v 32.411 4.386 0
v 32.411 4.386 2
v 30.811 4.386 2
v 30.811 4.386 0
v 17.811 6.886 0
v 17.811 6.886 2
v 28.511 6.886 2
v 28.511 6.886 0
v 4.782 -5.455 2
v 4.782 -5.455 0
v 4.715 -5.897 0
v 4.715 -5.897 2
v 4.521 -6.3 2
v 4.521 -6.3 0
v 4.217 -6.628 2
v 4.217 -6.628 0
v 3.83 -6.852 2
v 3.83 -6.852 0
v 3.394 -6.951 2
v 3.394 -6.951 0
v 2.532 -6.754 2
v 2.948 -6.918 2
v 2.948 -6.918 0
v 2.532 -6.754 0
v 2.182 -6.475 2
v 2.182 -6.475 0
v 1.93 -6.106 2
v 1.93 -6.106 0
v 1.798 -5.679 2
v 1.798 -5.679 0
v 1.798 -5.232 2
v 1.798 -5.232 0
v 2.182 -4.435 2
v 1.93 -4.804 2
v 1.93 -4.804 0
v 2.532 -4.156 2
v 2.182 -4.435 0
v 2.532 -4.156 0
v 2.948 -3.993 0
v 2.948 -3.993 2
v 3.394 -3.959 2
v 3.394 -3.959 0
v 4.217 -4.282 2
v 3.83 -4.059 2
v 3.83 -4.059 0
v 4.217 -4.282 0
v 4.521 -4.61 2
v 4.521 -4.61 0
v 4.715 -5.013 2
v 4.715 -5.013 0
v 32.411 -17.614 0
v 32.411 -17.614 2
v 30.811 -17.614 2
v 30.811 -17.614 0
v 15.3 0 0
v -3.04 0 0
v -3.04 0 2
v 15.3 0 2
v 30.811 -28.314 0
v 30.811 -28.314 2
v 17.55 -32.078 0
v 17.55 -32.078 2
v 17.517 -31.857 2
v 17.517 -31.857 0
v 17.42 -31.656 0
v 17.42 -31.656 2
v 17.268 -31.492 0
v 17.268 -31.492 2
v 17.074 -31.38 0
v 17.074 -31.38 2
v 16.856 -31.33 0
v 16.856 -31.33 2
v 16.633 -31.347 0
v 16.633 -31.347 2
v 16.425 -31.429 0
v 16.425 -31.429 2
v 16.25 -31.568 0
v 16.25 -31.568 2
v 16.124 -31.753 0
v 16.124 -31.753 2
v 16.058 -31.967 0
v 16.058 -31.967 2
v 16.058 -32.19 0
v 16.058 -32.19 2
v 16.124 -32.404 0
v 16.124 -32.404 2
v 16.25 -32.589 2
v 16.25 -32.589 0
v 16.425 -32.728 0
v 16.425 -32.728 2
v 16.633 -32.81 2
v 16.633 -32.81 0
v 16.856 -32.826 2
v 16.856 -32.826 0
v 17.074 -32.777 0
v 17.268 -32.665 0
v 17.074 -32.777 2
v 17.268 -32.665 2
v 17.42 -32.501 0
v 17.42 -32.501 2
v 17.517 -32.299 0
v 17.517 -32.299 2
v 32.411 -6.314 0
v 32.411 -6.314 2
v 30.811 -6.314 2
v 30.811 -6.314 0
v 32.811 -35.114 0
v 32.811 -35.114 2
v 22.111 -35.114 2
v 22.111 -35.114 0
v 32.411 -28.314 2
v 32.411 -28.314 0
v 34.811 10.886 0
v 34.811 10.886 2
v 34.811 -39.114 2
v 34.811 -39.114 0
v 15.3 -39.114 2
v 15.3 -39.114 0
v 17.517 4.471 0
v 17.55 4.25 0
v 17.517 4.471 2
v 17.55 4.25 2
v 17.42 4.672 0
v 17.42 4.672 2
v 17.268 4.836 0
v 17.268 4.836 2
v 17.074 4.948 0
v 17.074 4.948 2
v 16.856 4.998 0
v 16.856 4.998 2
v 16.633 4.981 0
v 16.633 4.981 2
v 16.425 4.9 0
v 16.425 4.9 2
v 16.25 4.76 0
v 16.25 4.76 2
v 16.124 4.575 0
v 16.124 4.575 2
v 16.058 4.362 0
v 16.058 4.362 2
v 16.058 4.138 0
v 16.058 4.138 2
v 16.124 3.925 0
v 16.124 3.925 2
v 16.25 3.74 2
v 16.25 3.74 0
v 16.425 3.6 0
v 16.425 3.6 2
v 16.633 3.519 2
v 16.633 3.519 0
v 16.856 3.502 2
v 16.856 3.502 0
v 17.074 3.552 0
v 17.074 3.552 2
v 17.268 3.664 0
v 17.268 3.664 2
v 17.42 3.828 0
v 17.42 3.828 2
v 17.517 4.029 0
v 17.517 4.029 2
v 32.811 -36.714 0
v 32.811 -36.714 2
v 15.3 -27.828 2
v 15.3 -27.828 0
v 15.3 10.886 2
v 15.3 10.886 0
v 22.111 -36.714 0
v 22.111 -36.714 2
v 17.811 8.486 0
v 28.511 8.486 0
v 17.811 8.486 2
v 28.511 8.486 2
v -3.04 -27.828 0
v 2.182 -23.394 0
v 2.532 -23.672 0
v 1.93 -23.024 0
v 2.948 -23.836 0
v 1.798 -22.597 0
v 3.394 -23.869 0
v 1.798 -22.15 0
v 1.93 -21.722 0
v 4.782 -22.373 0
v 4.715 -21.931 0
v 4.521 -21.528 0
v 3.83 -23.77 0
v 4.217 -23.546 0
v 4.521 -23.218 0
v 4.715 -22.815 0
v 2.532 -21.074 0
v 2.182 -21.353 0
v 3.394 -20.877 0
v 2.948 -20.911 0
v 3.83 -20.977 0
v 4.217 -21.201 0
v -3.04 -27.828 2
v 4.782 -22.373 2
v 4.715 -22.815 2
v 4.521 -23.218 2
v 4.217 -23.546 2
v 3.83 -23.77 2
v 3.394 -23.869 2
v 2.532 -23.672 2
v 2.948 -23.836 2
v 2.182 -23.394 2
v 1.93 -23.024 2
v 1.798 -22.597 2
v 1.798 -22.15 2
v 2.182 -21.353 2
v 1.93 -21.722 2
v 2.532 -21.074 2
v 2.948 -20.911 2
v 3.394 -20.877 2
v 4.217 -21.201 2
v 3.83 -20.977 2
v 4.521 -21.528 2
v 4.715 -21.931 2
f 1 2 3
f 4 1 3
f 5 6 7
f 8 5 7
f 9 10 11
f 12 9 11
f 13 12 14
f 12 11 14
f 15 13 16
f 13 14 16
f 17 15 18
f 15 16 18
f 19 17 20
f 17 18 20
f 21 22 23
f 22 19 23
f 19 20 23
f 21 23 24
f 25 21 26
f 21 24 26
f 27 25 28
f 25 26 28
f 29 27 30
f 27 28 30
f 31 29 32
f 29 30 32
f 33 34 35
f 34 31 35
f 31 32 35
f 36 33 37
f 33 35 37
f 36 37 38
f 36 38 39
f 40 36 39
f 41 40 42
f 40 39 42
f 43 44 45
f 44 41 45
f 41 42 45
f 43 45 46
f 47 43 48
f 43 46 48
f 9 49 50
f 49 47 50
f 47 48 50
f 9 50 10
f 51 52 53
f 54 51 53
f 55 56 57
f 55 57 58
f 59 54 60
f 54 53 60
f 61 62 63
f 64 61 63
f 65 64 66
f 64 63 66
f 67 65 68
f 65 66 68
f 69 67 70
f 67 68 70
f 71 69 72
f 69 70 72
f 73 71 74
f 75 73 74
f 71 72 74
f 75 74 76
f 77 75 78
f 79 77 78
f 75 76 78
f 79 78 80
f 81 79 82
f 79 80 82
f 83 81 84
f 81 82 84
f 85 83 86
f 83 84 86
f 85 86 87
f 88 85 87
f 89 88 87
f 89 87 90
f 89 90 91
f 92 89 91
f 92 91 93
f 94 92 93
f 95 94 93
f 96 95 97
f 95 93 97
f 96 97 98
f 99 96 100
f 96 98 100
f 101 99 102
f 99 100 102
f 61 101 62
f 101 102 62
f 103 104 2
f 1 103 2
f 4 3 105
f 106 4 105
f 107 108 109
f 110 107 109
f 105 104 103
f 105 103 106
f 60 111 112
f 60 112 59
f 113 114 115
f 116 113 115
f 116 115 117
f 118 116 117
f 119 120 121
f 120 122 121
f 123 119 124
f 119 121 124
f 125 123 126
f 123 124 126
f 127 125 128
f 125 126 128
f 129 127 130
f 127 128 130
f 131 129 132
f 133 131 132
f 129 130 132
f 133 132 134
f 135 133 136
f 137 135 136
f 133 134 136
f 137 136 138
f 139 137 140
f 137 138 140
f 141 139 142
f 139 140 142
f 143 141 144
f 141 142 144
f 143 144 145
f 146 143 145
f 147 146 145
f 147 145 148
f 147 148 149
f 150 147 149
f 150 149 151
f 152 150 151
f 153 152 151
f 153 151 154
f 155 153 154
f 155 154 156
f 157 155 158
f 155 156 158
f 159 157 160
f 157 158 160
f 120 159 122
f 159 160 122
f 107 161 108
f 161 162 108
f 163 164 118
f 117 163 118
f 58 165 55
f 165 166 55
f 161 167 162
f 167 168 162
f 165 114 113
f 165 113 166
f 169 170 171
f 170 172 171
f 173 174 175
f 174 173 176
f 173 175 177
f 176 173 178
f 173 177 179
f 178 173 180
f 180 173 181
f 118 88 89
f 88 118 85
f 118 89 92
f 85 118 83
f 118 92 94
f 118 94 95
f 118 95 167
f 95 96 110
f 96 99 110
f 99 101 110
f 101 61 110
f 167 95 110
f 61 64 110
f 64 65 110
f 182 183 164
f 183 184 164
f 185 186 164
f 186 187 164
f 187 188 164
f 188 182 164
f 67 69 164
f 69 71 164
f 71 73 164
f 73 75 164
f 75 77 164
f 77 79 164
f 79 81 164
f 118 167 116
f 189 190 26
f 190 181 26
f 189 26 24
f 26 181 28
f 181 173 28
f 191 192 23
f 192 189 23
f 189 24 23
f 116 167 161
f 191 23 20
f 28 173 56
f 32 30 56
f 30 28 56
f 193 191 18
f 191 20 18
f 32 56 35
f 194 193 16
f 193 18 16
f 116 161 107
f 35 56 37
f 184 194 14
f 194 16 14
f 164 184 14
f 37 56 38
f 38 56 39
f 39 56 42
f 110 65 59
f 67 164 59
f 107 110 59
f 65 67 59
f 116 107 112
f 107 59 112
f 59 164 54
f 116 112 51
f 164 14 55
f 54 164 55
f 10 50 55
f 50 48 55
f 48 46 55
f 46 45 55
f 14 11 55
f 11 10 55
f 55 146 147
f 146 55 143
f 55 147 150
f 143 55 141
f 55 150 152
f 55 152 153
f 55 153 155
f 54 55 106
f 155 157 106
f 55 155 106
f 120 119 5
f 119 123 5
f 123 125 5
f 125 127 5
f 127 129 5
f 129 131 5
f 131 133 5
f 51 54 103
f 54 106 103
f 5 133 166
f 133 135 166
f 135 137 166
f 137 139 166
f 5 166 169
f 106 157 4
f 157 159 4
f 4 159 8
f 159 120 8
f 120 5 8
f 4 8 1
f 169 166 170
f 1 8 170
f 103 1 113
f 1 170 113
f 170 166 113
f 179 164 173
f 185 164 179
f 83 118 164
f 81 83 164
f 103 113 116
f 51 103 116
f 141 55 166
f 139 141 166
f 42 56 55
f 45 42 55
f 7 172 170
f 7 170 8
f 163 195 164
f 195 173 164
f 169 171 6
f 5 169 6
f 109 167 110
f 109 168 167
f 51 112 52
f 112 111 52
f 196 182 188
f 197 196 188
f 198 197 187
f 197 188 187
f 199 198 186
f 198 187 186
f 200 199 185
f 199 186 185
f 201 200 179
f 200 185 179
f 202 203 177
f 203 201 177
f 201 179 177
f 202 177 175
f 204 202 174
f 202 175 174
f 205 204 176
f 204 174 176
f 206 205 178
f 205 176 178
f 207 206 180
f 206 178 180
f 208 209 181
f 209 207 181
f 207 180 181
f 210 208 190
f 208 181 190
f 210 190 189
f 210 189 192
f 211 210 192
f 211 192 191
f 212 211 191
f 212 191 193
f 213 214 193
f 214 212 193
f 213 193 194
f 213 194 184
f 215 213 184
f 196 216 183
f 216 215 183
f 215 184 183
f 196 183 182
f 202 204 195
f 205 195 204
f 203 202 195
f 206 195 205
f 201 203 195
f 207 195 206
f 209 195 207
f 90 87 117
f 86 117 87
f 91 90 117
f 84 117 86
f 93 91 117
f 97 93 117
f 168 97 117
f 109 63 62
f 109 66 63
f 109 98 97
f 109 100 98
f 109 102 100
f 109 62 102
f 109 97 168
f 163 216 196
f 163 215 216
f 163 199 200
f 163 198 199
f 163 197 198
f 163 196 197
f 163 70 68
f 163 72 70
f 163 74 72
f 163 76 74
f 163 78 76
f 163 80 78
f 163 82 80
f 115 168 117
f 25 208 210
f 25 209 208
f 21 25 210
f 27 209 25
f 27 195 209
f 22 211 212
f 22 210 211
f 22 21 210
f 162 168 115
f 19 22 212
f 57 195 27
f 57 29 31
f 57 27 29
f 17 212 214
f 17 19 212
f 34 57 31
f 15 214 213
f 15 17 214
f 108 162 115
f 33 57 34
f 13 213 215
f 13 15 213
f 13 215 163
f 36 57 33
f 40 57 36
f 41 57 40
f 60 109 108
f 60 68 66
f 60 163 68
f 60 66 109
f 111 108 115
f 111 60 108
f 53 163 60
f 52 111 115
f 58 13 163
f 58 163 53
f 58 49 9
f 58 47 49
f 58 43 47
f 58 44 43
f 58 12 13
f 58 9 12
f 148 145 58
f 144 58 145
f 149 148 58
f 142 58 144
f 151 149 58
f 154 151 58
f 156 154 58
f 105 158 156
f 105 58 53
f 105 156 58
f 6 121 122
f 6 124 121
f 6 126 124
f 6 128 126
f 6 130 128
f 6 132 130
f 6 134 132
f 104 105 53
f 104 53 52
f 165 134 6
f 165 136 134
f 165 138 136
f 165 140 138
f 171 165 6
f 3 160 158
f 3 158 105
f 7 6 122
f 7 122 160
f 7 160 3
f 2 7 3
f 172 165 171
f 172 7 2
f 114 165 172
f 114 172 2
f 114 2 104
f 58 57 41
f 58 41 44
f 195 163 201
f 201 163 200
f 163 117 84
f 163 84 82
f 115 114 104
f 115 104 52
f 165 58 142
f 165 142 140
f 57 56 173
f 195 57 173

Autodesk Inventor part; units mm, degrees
ref_plane "YZ Plane" through (0, 0, 0) normal (1, 0, 0) x (0, 1, 0)
ref_plane "XZ Plane" through (0, 0, 0) normal (0, 1, 0) x (-1, 0, 0)
ref_plane "XY Plane" through (0, 0, 0) normal (0, 0, 1) x (1, 0, 0)
sketch "Sketch1" plane through (0, 0, 0) normal (0, 0, 1) x (1, 0, 0)
  circle A0 centre (3.2816, -5.4552) radius 1.5 projected
  line L0 (4.45, -12.0667) -> (7.65, -10.2192) projected
  line L1 (7.65, -10.2192) -> (10.85, -12.0667) projected
  line L2 (10.85, -12.0667) -> (10.85, -15.7617) projected
  line L3 (10.85, -15.7617) -> (7.65, -17.6093) projected
  line L4 (7.65, -17.6093) -> (4.45, -15.7617) projected
  line L5 (4.45, -15.7617) -> (4.45, -12.0667) projected
  circle A1 centre (3.2816, -22.3733) radius 1.5 projected
  line L6 (15.3, -27.8284) -> (15.3, 0) projected
  line L7 (0, 0) -> (15.3, 0) projected
  line L8 (0, -27.8284) -> (0, 0) projected
  line L9 (0, -27.8284) -> (15.3, -27.8284) projected
  line L10 (28.3, 5.8858) -> (15.3, 5.8858) projected
  line L11 (15.3, 5.8858) -> (15.3, -34.1142) projected
  line L12 (28.3, -34.1142) -> (15.3, -34.1142) projected
  line L13 (28.3, 5.8858) -> (28.3, -34.1142) projected
  line L14 (38.8108, -39.1142) -> (38.8108, 10.8858) projected
  line L15 (38.8108, 10.8858) -> (15.3, 10.8858) projected
  line L16 (15.3, -2.6142) -> (15.3, 10.8858) projected
  line L17 (15.3, -2.6142) -> (38.3, -2.6142) projected
  line L18 (38.3, -12.6142) -> (38.3, -2.6142) projected
  line L19 (38.3, -12.6142) -> (7.65, -12.6142) projected
  arc A2 (7.65, -15.6142) -> (7.65, -12.6142) centre (7.65, -14.1142) ccw projected
  line L20 (7.65, -15.6142) -> (38.3, -15.6142) projected
  line L21 (38.3, -25.6142) -> (38.3, -15.6142) projected
  line L22 (38.3, -25.6142) -> (15.3, -25.6142) projected
  line L23 (15.3, -39.1142) -> (15.3, -25.6142) projected
  line L24 (38.8108, -39.1142) -> (15.3, -39.1142) projected
  line L25 (-7.04, -39.1142) -> (14.96, -39.1142) projected
  line L26 (-7.04, -39.1142) -> (38.8108, -39.1142)
  line L27 (38.8108, -39.1142) -> (38.8108, 10.8858)
  line L28 (38.8108, 10.8858) -> (-7.04, 10.8858)
  line L29 (-7.04, 10.8858) -> (-7.04, -39.1142)
  line L30 (-5.04, -27.8284) -> (13.16, -27.8284) projected
  line L31 (13.16, 0) -> (-5.04, 0) projected
  line L32 (-3.04, -35.1142) -> (34.8108, -35.1142)
  line L33 (34.8108, -35.1142) -> (34.8108, 6.8858)
  line L34 (34.8108, 6.8858) -> (-3.04, 6.8858)
  line L35 (-3.04, 6.8858) -> (-3.04, -35.1142)
  line L36 (34.8108, -35.1142) -> (15.3, -35.1142)
  line L37 (15.3, -35.1142) -> (15.3, -39.1142)
  line L38 (15.3, -39.1142) -> (34.8108, -39.1142)
  line L39 (34.8108, -39.1142) -> (34.8108, -35.1142)
  line L40 (15.3, 6.8858) -> (34.8108, 6.8858)
  line L41 (34.8108, 6.8858) -> (34.8108, 10.8858)
  line L42 (34.8108, 10.8858) -> (15.3, 10.8858)
  line L43 (15.3, 10.8858) -> (15.3, 6.8858)
  point P0 (-3.04, 0)
  point P1 (-3.04, -27.8284)
  dimension "d0" = 4
extrude "Extrusion1" add sketch "Sketch1" along normal blind 2 contours L5 L4 L3 L2 L20 L6 L9 L8 L7 L19 L1 L0 | L0 L1 L2 L19 A2 L20 L3 L4 L5 | L19 L6 L20 L2 | L2 L20 A2 L19 | L19 L13 L20 L6 | L6 L17 L13 L19 | L20 L13 L22 L6 | L6 L11 L10 L13 L17 | L19 L33 L20 L13 | L13 L17 L33 L19 | L22 L13 L12 L11 L6 | L20 L33 L22 L13 | L13 L10 L16 L34 L33 L17 | L33 L17 L18 L19 | L19 L18 L17 L33 L41 L15 L14 L24 L39 L22 L21 L20 | L22 L33 L32 L23 L12 L13 | L20 L21 L22 L33 | L8 L30 L35 L31 | L16 L15 L41 L34 | L32 L39 L24 L23
sketch "Sketch2" plane through (0, 0, 2) normal (0, 0, 1) x (1, 0, 0)
  line L0 (15.3, 0) -> (-3.04, 0) projected
  line L1 (-3.04, 0) -> (-3.04, -27.8284) projected
  line L2 (-3.04, -27.8284) -> (15.3, -27.8284) projected
  line L3 (15.3, -27.8284) -> (15.3, -39.1142) projected
  line L4 (15.3, -39.1142) -> (38.8108, -39.1142) projected
  line L5 (38.8108, -39.1142) -> (38.8108, 10.8858) projected
  line L6 (38.8108, 10.8858) -> (15.3, 10.8858) projected
  line L7 (15.3, 10.8858) -> (15.3, 0) projected
  circle A0 centre (3.2816, -22.3733) radius 1.5 projected
  circle A1 centre (3.2816, -5.4552) radius 1.5 projected
  line L8 (15.3, -39.1142) -> (38.8108, -39.1142) projected
  line L9 (38.8108, 10.8858) -> (34.8108, 10.8858)
  line L10 (34.8108, 10.8858) -> (34.8108, -39.1142)
  line L11 (34.8108, -39.1142) -> (38.8108, -39.1142)
  line L12 (38.8108, -39.1142) -> (38.8108, 10.8858)
  point P0 (0, 0)
  dimension "d3" = 4
extrude "Extrusion2" cut sketch "Sketch2" against normal blind 2 contours L6 L5 L4 L10
sketch "Sketch3" plane through (0, 0, 2) normal (0, 0, 1) x (1, 0, 0)
  point P0 (0, 0)
sketch "Sketch4" plane through (0, 0, 2) normal (0, 0, 1) x (1, 0, 0)
  circle A0 centre (16.8, -32.0784) radius 0.75 projected
  circle A1 centre (16.8, 4.25) radius 0.75 projected
  point P0 (0, 0)
extrude "Extrusion3" cut sketch "Sketch4" against normal through all
sketch "Sketch5" plane through (0, 0, 2) normal (0, 0, 1) x (1, 0, 0)
  circle A0 centre (16.8, 4.25) radius 0.75 projected
  circle A1 centre (16.8, -32.0784) radius 0.75 projected
  line L0 (34.8108, -39.1142) -> (34.8108, 10.8858) projected
  line L1 (34.8108, 10.8858) -> (15.3, 10.8858) projected
  line L2 (15.3, 10.8858) -> (15.3, 0) projected
  line L3 (15.3, 0) -> (-3.04, 0) projected
  line L4 (-3.04, 0) -> (-3.04, -27.8284) projected
  line L5 (-3.04, -27.8284) -> (15.3, -27.8284) projected
  line L6 (15.3, -27.8284) -> (15.3, -39.1142) projected
  line L7 (15.3, -39.1142) -> (34.8108, -39.1142) projected
  circle A2 centre (3.2816, -22.3733) radius 1.5 projected
  circle A3 centre (3.2816, -5.4552) radius 1.5 projected
  line L8 (22.1108, -36.7142) -> (32.8108, -36.7142) projected
  line L9 (22.1108, -36.7142) -> (22.1108, -35.1142) projected
  line L10 (32.8108, -35.1142) -> (22.1108, -35.1142) projected
  line L11 (32.8108, -36.7142) -> (32.8108, -35.1142) projected
  line L12 (32.4108, -28.3142) -> (32.4108, -17.6142) projected
  line L13 (32.4108, -28.3142) -> (30.8108, -28.3142) projected
  line L14 (30.8108, -17.6142) -> (30.8108, -28.3142) projected
  line L15 (32.4108, -17.6142) -> (30.8108, -17.6142) projected
  line L16 (32.4108, -6.3142) -> (32.4108, 4.3858) projected
  line L17 (32.4108, -6.3142) -> (30.8108, -6.3142) projected
  line L18 (30.8108, 4.3858) -> (30.8108, -6.3142) projected
  line L19 (32.4108, 4.3858) -> (30.8108, 4.3858) projected
  line L20 (32.8108, 8.4858) -> (22.1108, 8.4858) projected
  line L21 (32.8108, 8.4858) -> (32.8108, 6.8858) projected
  line L22 (22.1108, 6.8858) -> (32.8108, 6.8858) projected
  line L23 (22.1108, 8.4858) -> (22.1108, 6.8858) projected
  point P0 (0, 0)
extrude "Extrusion4" cut sketch "Sketch5" against normal through all contours L9 L10 L11 L8 | L13 L14 L15 L12 | L17 L18 L19 L16 | L21 L22 L23 L20
sketch "Sketch6" plane through (0, 0, 2) normal (0, 0, 1) x (1, 0, 0)
  line L0 (30.8108, -28.3142) -> (30.8108, -17.6142) projected
  line L1 (30.8108, -17.6142) -> (32.4108, -17.6142) projected
  line L2 (32.4108, -17.6142) -> (32.4108, -28.3142) projected
  line L3 (32.4108, -28.3142) -> (30.8108, -28.3142) projected
  line L4 (30.8108, -6.3142) -> (30.8108, 4.3858) projected
  line L5 (30.8108, 4.3858) -> (32.4108, 4.3858) projected
  line L6 (32.4108, 4.3858) -> (32.4108, -6.3142) projected
  line L7 (32.4108, -6.3142) -> (30.8108, -6.3142) projected
  line L8 (22.1108, -35.1142) -> (32.8108, -35.1142) projected
  line L9 (32.8108, -35.1142) -> (32.8108, -36.7142) projected
  line L10 (32.8108, -36.7142) -> (22.1108, -36.7142) projected
  line L11 (22.1108, -36.7142) -> (22.1108, -35.1142) projected
  line L12 (32.8108, 6.8858) -> (22.1108, 6.8858) projected
  line L13 (22.1108, 6.8858) -> (22.1108, 8.4858) projected
  line L14 (22.1108, 8.4858) -> (32.8108, 8.4858) projected
  line L15 (32.8108, 8.4858) -> (32.8108, 6.8858) projected
  circle A0 centre (16.8, 4.25) radius 0.75 projected
  circle A1 centre (16.8, -32.0784) radius 0.75 projected
  line L16 (34.8108, -39.1142) -> (34.8108, 10.8858) projected
  line L17 (34.8108, 10.8858) -> (15.3, 10.8858) projected
  line L18 (15.3, 10.8858) -> (15.3, 0) projected
  line L19 (15.3, 0) -> (-3.04, 0) projected
  line L20 (-3.04, 0) -> (-3.04, -27.8284) projected
  line L21 (-3.04, -27.8284) -> (15.3, -27.8284) projected
  line L22 (15.3, -27.8284) -> (15.3, -39.1142) projected
  line L23 (15.3, -39.1142) -> (34.8108, -39.1142) projected
  circle A2 centre (3.2816, -22.3733) radius 1.5 projected
  circle A3 centre (3.2816, -5.4552) radius 1.5 projected
  line L24 (34.8108, 10.8858) -> (15.3, 10.8858) projected
  line L25 (15.3, 10.8858) -> (15.3, 0) projected
  line L26 (34.8108, 10.8858) -> (15.3, 10.8858)
  line L27 (15.3, 10.8858) -> (15.3, 10.0858)
  line L28 (15.3, 10.0858) -> (34.8108, 10.0858)
  line L29 (34.8108, 10.0858) -> (34.8108, 10.8858)
  line L30 (15.3, -27.8284) -> (15.3, -39.1142) projected
  line L31 (34.8108, 10.8858) -> (34.8108, -39.1142) projected
  line L32 (15.3, -39.1142) -> (34.8108, -39.1142)
  line L33 (34.8108, -39.1142) -> (34.8108, -38.3142)
  line L34 (34.8108, -38.3142) -> (15.3, -38.3142)
  line L35 (15.3, -38.3142) -> (15.3, -39.1142)
  point P0 (0, 0)
  dimension "d10" = 0.8
  dimension "d11" = 0.8
extrude "Extrusion5" cut sketch "Sketch6" against normal through all contours L23 L22 L34 L16 | L28 L18 L17 L16
sketch "Sketch7" plane through (0, 0, 2) normal (0, 0, 1) x (1, 0, 0)
  line L0 (34.8108, 10.0858) -> (15.3, 10.0858) projected
  line L1 (15.3, 10.0858) -> (15.3, 0) projected
  line L2 (15.3, 0) -> (-3.04, 0) projected
  line L3 (-3.04, 0) -> (-3.04, -27.8284) projected
  line L4 (-3.04, -27.8284) -> (15.3, -27.8284) projected
  line L5 (15.3, -27.8284) -> (15.3, -38.3142) projected
  line L6 (15.3, -38.3142) -> (34.8108, -38.3142) projected
  line L7 (34.8108, -38.3142) -> (34.8108, 10.0858) projected
  line L8 (30.8108, -28.3142) -> (30.8108, -17.6142) projected
  line L9 (30.8108, -17.6142) -> (32.4108, -17.6142) projected
  line L10 (32.4108, -17.6142) -> (32.4108, -28.3142) projected
  line L11 (32.4108, -28.3142) -> (30.8108, -28.3142) projected
  line L12 (30.8108, -6.3142) -> (30.8108, 4.3858) projected
  line L13 (30.8108, 4.3858) -> (32.4108, 4.3858) projected
  line L14 (32.4108, 4.3858) -> (32.4108, -6.3142) projected
  line L15 (32.4108, -6.3142) -> (30.8108, -6.3142) projected
  line L16 (22.1108, -35.1142) -> (32.8108, -35.1142) projected
  line L17 (32.8108, -35.1142) -> (32.8108, -36.7142) projected
  line L18 (32.8108, -36.7142) -> (22.1108, -36.7142) projected
  line L19 (22.1108, -36.7142) -> (22.1108, -35.1142) projected
  line L20 (32.8108, 6.8858) -> (22.1108, 6.8858) projected
  line L21 (22.1108, 6.8858) -> (22.1108, 8.4858) projected
  line L22 (22.1108, 8.4858) -> (32.8108, 8.4858) projected
  line L23 (32.8108, 8.4858) -> (32.8108, 6.8858) projected
  circle A0 centre (16.8, 4.25) radius 0.75 projected
  circle A1 centre (16.8, -32.0784) radius 0.75 projected
  circle A2 centre (3.2816, -22.3733) radius 1.5 projected
  circle A3 centre (3.2816, -5.4552) radius 1.5 projected
  line L24 (38.8108, 10.8858) -> (15.3, 10.8858) projected
  line L25 (38.8108, -39.1142) -> (15.3, -39.1142) projected
  line L26 (15.3, 10.0858) -> (34.8108, 10.0858) projected
  line L27 (15.3, 10.8858) -> (34.8108, 10.8858)
  line L28 (34.8108, 10.8858) -> (34.8108, 10.0858)
  line L29 (34.8108, 10.0858) -> (15.3, 10.0858)
  line L30 (15.3, 10.0858) -> (15.3, 10.8858)
  line L31 (34.8108, -38.3142) -> (15.3, -38.3142) projected
  line L32 (34.8108, -38.3142) -> (15.3, -38.3142)
  line L33 (15.3, -38.3142) -> (15.3, -39.1142)
  line L34 (15.3, -39.1142) -> (34.8108, -39.1142)
  line L35 (34.8108, -39.1142) -> (34.8108, -38.3142)
  point P0 (0, 0)
extrude "Extrusion6" add sketch "Sketch7" against normal up to surface (2 mm away) contours L0 L30 L24 L28 | L35 L25 L33 L6
sketch "Sketch8" plane through (0, 0, 2) normal (0, 0, 1) x (1, 0, 0)
  line L0 (15.3, 10.8858) -> (15.3, 0) projected
  line L1 (15.3, 0) -> (-3.04, 0) projected
  line L2 (-3.04, 0) -> (-3.04, -27.8284) projected
  line L3 (-3.04, -27.8284) -> (15.3, -27.8284) projected
  line L4 (15.3, -27.8284) -> (15.3, -39.1142) projected
  line L5 (15.3, -39.1142) -> (34.8108, -39.1142) projected
  line L6 (34.8108, -39.1142) -> (34.8108, 10.8858) projected
  line L7 (34.8108, 10.8858) -> (15.3, 10.8858) projected
  line L8 (30.8108, -28.3142) -> (30.8108, -17.6142) projected
  line L9 (30.8108, -17.6142) -> (32.4108, -17.6142) projected
  line L10 (32.4108, -17.6142) -> (32.4108, -28.3142) projected
  line L11 (32.4108, -28.3142) -> (30.8108, -28.3142) projected
  line L12 (30.8108, -6.3142) -> (30.8108, 4.3858) projected
  line L13 (30.8108, 4.3858) -> (32.4108, 4.3858) projected
  line L14 (32.4108, 4.3858) -> (32.4108, -6.3142) projected
  line L15 (32.4108, -6.3142) -> (30.8108, -6.3142) projected
  line L16 (22.1108, -35.1142) -> (32.8108, -35.1142) projected
  line L17 (32.8108, -35.1142) -> (32.8108, -36.7142) projected
  line L18 (32.8108, -36.7142) -> (22.1108, -36.7142) projected
  line L19 (22.1108, -36.7142) -> (22.1108, -35.1142) projected
  line L20 (32.8108, 6.8858) -> (22.1108, 6.8858) projected
  line L21 (22.1108, 6.8858) -> (22.1108, 8.4858) projected
  line L22 (22.1108, 8.4858) -> (32.8108, 8.4858) projected
  line L23 (32.8108, 8.4858) -> (32.8108, 6.8858) projected
  circle A0 centre (16.8, 4.25) radius 0.75 projected
  circle A1 centre (16.8, -32.0784) radius 0.75 projected
  circle A2 centre (3.2816, -22.3733) radius 1.5 projected
  circle A3 centre (3.2816, -5.4552) radius 1.5 projected
  line L24 (28.5108, 8.4858) -> (17.8108, 8.4858) projected
  line L25 (28.5108, 8.4858) -> (28.5108, 6.8858) projected
  line L26 (17.8108, 6.8858) -> (28.5108, 6.8858) projected
  line L27 (17.8108, 8.4858) -> (17.8108, 6.8858) projected
  point P0 (0, 0)
extrude "Extrusion7" cut sketch "Sketch8" against normal blind 10 contours L26 L27 L24 L21
sketch "Sketch9" plane through (0, 0, 2) normal (0, 0, 1) x (1, 0, 0)
  circle A0 centre (3.2816, -5.4552) radius 1.5 projected
  circle A1 centre (3.2816, -22.3733) radius 1.5 projected
  circle A2 centre (16.8, -32.0784) radius 0.75 projected
  circle A3 centre (16.8, 4.25) radius 0.75 projected
  line L0 (32.8108, 6.8858) -> (17.8108, 6.8858) projected
  line L1 (17.8108, 6.8858) -> (17.8108, 8.4858) projected
  line L2 (17.8108, 8.4858) -> (32.8108, 8.4858) projected
  line L3 (32.8108, 8.4858) -> (32.8108, 6.8858) projected
  line L4 (22.1108, -35.1142) -> (32.8108, -35.1142) projected
  line L5 (32.8108, -35.1142) -> (32.8108, -36.7142) projected
  line L6 (32.8108, -36.7142) -> (22.1108, -36.7142) projected
  line L7 (22.1108, -36.7142) -> (22.1108, -35.1142) projected
  line L8 (30.8108, -6.3142) -> (30.8108, 4.3858) projected
  line L9 (30.8108, 4.3858) -> (32.4108, 4.3858) projected
  line L10 (32.4108, 4.3858) -> (32.4108, -6.3142) projected
  line L11 (32.4108, -6.3142) -> (30.8108, -6.3142) projected
  line L12 (30.8108, -28.3142) -> (30.8108, -17.6142) projected
  line L13 (30.8108, -17.6142) -> (32.4108, -17.6142) projected
  line L14 (32.4108, -17.6142) -> (32.4108, -28.3142) projected
  line L15 (32.4108, -28.3142) -> (30.8108, -28.3142) projected
  line L16 (15.3, 10.8858) -> (15.3, 0) projected
  line L17 (15.3, 0) -> (-3.04, 0) projected
  line L18 (-3.04, 0) -> (-3.04, -27.8284) projected
  line L19 (-3.04, -27.8284) -> (15.3, -27.8284) projected
  line L20 (15.3, -27.8284) -> (15.3, -39.1142) projected
  line L21 (15.3, -39.1142) -> (34.8108, -39.1142) projected
  line L22 (34.8108, -39.1142) -> (34.8108, 10.8858) projected
  line L23 (34.8108, 10.8858) -> (15.3, 10.8858) projected
  line L24 (28.5108, 8.4858) -> (28.5108, 6.8858) projected
  point P0 (0, 0)
extrude "Extrusion8" add sketch "Sketch9" against normal up to surface (2 mm away) contours L0 L24 L2 L3
properties part number "pcbek"
